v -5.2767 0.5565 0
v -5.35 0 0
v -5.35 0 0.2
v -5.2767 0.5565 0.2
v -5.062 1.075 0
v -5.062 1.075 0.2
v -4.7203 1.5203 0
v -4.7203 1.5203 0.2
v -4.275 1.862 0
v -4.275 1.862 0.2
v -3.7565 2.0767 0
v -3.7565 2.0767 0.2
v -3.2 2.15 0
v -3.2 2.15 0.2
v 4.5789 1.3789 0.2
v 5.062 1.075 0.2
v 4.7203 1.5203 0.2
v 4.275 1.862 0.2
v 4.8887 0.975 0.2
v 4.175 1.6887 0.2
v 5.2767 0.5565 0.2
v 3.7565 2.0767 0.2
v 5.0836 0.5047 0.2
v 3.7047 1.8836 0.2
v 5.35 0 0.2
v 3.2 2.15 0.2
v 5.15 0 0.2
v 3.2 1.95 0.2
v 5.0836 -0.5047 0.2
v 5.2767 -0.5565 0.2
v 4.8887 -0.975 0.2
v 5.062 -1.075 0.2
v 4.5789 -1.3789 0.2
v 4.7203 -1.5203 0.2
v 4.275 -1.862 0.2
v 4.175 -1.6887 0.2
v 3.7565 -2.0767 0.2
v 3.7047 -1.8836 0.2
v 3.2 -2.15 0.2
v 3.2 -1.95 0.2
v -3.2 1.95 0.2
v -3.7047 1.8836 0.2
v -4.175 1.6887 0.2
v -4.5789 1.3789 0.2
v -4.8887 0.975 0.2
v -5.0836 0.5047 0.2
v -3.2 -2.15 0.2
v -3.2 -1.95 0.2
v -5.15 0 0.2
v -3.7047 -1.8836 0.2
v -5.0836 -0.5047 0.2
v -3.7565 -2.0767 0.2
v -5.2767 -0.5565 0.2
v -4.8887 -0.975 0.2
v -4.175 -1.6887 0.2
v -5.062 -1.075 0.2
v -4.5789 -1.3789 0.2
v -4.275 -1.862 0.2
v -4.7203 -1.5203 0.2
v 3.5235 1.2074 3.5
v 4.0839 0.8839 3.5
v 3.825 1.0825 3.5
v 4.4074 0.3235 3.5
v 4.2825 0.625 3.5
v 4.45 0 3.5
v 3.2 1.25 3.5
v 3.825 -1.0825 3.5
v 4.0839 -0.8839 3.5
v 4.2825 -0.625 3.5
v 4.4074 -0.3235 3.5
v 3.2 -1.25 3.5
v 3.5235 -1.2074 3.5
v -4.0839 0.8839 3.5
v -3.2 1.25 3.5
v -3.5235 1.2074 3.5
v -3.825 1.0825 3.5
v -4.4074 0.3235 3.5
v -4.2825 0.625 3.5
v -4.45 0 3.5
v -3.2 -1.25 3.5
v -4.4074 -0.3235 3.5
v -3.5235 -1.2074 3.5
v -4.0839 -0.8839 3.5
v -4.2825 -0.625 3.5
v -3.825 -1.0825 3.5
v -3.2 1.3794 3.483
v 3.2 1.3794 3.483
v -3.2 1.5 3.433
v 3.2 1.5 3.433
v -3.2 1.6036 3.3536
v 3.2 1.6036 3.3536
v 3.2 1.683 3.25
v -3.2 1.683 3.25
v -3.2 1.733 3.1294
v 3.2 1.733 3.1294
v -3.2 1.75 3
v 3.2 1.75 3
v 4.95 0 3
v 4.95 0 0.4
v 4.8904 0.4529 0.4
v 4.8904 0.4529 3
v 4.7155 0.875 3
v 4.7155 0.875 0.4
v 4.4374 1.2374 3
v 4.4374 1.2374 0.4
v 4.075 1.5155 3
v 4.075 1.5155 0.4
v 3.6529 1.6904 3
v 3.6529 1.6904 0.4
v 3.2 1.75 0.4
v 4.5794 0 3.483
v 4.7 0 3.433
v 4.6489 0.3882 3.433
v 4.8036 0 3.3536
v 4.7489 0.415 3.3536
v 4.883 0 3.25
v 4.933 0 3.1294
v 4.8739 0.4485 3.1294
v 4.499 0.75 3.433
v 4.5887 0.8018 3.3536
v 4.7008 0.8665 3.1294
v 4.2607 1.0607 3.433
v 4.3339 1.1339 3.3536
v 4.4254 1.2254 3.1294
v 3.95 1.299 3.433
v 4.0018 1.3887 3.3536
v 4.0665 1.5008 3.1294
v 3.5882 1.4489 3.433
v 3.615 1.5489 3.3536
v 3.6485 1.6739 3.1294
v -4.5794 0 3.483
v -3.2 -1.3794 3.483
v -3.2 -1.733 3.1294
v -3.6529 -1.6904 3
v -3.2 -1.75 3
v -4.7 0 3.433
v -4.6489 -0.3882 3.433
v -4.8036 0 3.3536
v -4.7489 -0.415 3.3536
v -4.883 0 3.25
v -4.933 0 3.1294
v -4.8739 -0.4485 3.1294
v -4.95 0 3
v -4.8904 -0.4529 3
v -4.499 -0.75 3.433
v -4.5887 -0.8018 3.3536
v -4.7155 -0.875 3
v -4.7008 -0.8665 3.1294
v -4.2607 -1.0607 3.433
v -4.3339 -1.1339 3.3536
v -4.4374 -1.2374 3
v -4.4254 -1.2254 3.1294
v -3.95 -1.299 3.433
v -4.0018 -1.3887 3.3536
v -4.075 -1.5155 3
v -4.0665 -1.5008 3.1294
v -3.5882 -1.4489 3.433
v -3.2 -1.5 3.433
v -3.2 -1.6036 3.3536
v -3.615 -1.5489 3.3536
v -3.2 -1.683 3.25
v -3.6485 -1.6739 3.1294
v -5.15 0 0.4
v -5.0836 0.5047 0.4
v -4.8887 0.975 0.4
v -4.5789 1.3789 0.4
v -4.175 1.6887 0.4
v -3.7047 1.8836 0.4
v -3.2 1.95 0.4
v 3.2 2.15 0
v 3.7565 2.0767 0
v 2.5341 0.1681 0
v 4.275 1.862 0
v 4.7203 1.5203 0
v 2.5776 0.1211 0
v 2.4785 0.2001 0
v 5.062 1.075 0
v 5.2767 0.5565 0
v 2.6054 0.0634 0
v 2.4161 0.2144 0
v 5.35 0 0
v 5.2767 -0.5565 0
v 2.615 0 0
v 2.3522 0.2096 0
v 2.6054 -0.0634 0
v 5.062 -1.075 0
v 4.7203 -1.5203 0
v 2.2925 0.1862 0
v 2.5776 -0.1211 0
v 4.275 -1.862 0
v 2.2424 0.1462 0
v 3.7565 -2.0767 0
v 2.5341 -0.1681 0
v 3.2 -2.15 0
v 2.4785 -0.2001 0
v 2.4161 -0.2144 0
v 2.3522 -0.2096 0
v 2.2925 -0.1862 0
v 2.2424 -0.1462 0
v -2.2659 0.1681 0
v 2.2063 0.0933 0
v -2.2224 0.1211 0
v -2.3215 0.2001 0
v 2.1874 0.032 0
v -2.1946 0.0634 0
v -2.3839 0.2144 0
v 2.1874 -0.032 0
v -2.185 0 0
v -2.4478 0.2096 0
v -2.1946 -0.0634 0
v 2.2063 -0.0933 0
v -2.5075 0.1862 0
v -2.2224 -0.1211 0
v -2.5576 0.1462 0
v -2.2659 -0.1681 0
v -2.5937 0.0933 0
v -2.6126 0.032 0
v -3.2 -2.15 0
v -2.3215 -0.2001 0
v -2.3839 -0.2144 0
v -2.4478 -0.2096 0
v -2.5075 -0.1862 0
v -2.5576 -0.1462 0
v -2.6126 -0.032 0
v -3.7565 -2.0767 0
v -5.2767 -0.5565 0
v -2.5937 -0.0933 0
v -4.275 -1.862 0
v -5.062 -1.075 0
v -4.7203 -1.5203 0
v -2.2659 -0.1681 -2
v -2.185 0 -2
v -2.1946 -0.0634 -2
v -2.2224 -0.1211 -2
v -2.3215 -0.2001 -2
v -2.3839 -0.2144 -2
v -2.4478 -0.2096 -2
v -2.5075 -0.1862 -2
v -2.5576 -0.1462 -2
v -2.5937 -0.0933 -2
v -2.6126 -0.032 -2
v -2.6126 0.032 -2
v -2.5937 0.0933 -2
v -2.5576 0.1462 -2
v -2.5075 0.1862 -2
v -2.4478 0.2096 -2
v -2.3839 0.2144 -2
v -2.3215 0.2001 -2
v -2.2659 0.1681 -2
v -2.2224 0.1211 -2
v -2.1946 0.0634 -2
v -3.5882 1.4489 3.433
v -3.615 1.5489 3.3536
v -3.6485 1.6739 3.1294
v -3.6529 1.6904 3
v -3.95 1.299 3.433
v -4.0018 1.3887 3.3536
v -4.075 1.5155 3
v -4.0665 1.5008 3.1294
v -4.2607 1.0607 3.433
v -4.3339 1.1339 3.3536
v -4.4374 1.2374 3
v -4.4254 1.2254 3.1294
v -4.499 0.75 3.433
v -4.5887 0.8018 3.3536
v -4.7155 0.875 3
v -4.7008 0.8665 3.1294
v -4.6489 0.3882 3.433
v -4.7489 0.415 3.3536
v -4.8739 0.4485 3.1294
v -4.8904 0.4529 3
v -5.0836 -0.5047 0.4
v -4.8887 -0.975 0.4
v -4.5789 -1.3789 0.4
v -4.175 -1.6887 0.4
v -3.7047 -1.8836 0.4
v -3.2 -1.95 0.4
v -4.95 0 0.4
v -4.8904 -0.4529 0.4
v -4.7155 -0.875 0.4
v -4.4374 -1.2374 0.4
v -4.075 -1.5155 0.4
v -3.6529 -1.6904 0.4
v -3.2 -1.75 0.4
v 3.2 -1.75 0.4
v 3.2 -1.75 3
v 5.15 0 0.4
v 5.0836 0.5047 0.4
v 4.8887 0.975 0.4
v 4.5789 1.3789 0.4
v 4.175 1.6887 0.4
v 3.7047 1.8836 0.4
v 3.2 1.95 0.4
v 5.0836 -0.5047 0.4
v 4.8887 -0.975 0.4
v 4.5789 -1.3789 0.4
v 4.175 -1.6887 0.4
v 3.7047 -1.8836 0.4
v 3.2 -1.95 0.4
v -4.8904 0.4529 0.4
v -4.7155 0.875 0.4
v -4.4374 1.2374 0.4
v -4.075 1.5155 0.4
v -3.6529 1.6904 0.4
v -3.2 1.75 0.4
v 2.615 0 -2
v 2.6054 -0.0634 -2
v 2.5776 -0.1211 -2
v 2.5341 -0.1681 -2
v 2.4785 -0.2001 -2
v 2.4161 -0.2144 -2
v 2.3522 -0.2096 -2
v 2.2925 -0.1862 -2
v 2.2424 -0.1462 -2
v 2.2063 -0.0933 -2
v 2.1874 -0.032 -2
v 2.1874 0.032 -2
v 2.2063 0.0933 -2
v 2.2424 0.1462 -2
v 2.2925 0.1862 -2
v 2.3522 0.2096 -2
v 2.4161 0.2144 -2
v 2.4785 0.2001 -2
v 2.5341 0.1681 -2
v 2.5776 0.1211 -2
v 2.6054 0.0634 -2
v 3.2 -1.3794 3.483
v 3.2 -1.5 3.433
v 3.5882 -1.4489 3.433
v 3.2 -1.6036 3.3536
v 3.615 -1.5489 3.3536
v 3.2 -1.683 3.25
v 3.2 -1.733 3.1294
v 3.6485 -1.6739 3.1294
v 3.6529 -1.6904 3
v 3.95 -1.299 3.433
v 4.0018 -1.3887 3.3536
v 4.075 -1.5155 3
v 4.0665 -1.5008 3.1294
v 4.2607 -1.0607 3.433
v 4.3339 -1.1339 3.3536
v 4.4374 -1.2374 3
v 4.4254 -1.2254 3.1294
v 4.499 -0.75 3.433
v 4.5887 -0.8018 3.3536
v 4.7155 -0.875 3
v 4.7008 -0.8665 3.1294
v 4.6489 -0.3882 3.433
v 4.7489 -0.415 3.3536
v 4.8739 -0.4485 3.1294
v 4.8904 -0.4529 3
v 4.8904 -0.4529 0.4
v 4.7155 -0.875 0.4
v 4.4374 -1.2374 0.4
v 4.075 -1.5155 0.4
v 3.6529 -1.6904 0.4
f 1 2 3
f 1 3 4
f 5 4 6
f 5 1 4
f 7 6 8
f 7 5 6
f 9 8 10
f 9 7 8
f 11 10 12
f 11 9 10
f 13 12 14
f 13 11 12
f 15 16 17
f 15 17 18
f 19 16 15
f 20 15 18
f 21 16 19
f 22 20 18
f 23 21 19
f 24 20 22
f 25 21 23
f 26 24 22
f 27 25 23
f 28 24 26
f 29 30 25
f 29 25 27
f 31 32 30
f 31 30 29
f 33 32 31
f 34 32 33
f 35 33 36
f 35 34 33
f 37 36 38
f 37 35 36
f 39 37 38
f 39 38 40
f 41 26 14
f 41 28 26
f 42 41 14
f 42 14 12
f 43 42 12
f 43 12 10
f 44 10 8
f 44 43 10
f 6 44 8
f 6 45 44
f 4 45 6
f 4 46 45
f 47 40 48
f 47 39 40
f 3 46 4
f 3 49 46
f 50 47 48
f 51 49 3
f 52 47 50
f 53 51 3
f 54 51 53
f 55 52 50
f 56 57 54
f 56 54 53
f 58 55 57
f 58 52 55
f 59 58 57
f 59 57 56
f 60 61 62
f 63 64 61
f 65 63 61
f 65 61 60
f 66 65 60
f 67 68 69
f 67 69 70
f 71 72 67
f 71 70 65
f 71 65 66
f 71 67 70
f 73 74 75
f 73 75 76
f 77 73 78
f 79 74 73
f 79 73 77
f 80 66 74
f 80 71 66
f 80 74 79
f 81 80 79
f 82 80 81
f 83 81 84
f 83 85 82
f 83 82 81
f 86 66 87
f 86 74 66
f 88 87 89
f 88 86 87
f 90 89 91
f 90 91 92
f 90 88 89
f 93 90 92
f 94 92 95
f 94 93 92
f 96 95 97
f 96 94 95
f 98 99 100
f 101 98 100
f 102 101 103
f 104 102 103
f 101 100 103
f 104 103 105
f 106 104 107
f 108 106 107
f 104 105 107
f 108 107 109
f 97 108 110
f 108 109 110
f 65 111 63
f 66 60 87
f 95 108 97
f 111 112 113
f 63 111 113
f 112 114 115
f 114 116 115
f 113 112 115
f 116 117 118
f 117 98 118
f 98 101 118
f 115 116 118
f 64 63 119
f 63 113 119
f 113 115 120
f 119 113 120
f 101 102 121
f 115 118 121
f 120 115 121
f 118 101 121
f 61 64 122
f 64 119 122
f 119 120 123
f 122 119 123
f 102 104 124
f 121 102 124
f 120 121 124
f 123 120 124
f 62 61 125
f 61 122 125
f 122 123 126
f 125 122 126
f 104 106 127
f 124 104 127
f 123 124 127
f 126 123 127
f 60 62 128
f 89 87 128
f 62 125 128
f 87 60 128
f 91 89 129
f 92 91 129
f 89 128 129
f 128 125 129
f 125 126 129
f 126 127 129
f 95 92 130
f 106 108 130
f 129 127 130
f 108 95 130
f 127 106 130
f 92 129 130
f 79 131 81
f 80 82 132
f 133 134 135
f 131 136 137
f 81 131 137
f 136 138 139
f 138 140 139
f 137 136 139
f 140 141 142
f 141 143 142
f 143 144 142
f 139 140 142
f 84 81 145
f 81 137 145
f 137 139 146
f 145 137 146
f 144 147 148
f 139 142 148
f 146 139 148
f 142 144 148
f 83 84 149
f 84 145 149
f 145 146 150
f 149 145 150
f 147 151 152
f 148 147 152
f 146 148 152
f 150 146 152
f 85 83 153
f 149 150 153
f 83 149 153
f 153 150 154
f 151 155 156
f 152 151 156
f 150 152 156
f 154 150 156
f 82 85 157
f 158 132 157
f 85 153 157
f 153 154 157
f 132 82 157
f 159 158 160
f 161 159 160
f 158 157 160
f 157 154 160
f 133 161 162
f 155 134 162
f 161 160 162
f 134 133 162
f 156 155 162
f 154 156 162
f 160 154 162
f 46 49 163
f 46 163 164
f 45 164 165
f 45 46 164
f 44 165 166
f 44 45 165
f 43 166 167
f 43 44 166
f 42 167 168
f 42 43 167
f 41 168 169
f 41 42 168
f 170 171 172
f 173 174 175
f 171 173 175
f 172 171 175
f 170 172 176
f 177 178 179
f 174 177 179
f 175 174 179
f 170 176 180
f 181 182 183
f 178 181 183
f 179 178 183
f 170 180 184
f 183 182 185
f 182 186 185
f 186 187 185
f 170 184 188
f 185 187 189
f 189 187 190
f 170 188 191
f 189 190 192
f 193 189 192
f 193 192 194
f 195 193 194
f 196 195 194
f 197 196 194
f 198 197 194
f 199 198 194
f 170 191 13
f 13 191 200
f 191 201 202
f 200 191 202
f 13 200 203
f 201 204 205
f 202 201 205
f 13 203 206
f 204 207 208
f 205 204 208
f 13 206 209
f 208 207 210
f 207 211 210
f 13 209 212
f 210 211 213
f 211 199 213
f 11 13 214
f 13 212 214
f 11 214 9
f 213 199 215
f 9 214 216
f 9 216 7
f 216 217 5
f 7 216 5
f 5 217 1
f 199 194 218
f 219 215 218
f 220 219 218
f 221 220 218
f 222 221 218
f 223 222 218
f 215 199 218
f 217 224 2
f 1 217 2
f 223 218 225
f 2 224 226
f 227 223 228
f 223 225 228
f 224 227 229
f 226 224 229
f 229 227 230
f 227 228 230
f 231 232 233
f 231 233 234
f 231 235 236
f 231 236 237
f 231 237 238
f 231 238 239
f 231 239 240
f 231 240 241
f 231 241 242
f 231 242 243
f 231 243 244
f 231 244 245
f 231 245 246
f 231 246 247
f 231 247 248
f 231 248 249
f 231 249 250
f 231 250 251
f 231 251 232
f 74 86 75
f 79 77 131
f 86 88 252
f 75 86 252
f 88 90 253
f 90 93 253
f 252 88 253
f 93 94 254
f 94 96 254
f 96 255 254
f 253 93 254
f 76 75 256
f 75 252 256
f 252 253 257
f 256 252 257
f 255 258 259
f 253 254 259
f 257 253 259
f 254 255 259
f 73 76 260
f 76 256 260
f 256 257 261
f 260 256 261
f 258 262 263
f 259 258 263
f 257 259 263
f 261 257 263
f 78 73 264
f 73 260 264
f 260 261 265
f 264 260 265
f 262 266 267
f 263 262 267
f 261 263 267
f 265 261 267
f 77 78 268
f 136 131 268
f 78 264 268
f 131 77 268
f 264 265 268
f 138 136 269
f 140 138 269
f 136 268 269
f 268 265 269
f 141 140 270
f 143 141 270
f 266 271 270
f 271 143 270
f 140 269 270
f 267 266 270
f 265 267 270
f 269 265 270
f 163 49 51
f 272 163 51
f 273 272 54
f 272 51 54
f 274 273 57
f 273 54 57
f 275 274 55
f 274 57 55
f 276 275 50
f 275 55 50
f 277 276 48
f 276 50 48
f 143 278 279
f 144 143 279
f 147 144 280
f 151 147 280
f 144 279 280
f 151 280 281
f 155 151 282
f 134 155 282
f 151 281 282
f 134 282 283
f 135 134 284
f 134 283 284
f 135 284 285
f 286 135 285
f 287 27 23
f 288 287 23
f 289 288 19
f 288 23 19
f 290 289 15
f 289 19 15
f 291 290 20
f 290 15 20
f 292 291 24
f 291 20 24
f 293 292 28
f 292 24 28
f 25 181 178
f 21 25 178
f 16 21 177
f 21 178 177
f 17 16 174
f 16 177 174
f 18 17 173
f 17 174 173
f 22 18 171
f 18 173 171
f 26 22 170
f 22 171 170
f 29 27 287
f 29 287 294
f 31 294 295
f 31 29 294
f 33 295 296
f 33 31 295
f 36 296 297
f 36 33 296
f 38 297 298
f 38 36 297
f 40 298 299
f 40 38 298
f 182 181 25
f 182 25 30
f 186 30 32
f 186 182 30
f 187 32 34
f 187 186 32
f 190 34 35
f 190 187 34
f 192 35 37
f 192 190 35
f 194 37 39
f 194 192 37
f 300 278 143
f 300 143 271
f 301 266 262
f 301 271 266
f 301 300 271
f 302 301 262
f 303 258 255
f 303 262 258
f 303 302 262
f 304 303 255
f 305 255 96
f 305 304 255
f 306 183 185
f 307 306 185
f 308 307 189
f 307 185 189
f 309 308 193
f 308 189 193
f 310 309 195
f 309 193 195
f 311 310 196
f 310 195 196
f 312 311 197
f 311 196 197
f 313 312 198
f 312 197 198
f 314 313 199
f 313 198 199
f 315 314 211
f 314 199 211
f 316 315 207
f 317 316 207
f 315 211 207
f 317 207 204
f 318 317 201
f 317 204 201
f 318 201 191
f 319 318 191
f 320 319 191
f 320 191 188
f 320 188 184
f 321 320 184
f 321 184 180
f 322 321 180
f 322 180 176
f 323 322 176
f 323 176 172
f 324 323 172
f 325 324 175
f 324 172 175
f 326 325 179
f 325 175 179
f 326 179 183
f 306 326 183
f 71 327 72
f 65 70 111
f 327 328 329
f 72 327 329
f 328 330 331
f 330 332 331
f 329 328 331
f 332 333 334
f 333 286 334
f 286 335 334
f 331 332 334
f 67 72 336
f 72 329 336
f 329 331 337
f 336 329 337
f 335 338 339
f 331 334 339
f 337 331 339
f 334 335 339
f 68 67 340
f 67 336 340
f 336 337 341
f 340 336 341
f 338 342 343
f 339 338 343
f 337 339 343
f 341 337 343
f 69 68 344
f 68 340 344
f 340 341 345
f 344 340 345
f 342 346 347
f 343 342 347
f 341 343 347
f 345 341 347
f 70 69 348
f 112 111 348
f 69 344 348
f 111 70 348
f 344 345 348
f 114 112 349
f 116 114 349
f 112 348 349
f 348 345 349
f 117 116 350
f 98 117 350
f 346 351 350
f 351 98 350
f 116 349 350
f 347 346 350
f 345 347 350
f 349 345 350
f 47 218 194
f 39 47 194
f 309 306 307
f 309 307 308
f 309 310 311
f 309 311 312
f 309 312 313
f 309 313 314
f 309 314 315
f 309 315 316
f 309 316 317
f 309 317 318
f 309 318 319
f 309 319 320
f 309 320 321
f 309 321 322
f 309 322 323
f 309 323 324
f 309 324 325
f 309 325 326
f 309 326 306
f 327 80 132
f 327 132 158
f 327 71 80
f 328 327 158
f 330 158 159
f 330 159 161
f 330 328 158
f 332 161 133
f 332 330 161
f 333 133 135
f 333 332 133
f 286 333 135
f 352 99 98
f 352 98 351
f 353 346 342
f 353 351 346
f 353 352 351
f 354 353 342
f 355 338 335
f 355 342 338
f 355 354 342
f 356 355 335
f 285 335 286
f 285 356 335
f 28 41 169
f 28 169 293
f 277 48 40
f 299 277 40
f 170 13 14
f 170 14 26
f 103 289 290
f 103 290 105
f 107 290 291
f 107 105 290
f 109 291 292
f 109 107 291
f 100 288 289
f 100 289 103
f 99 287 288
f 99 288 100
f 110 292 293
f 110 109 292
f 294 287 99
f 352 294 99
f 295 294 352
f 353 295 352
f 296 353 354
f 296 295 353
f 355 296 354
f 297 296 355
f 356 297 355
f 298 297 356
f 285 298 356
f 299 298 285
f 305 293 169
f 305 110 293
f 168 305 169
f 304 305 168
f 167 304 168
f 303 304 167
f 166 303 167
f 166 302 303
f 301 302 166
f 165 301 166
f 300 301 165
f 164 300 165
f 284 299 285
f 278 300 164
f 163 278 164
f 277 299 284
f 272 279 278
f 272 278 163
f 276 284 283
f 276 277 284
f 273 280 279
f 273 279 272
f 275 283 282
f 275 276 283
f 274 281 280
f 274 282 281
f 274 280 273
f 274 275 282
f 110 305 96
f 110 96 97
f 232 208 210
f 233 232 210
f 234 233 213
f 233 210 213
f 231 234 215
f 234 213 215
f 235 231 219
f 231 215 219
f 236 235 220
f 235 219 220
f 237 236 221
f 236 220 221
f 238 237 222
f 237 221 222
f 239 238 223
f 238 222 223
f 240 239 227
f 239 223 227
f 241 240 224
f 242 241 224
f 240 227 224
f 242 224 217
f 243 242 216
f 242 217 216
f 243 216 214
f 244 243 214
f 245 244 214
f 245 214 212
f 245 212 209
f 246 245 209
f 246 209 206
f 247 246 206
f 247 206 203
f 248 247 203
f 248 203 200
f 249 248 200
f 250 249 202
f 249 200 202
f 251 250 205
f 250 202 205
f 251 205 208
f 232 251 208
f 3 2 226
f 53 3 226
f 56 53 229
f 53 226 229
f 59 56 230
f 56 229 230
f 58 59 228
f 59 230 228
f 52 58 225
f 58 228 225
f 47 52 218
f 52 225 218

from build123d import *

# Parameters (mm, degrees)
F1_DEPTH  = 0.2
F3_DEPTH  = 0.2
F5_DEPTH  = 3.1
F8_R      = 0.5
F9_R      = 0.215
F10_DEPTH = 2


with BuildPart() as f1:
    # F0 (on Top) → F1 (new body)
    with BuildSketch(Plane.XY):
        with BuildLine():
            Line((0, 2.15), (0, 0))
            Line((0, 0), (5.35, 0))
            ThreePointArc((5.35, 0), (4.72028, 1.52028), (3.2, 2.15))
            Line((3.2, 2.15), (0, 2.15))
        make_face()
    extrude(amount=F1_DEPTH)

    # F2 (on face) → F3 (join)
    with BuildSketch(Plane.XY.offset(0.2)):
        with BuildLine():
            Line((0, 0), (5.15, 0))
            ThreePointArc((5.15, 0), (4.578858, 1.378858), (3.2, 1.95))
            Line((3.2, 1.95), (0, 1.95))
            Line((0, 1.95), (0, 0))
        make_face()
    extrude(amount=F3_DEPTH)

    # F4 (on face) → F5 (join)
    with BuildSketch(Plane.XY.offset(0.4)):
        with BuildLine():
            Line((0, 0), (4.95, 0))
            ThreePointArc((4.95, 0), (4.437437, 1.237437), (3.2, 1.75))
            Line((3.2, 1.75), (0, 1.75))
            Line((0, 1.75), (0, 0))
        make_face()
    extrude(amount=F5_DEPTH)

    # F6: F1 across face


with BuildPart() as f1_1:
    add(f1.part)
    add(f1.part.mirror(Plane(origin=(0, 0.895016, 1.719576), x_dir=(0, -1, 0), z_dir=(-1, 0, 0))))

    # F7: F1 across face


with BuildPart() as f1_2:
    add(f1_1.part)
    add(f1_1.part.mirror(Plane(origin=(0, 0, 1.739109), x_dir=(1, 0, 0), z_dir=(0, -1, 0))))

    # F8
    f8_edges = [f1_2.edges().sort_by_distance(p)[0] for p in [
        (0, 1.75, 3.5),
        (-4.95, 0, 3.5),
        (0, -1.75, 3.5),
        (4.95, 0, 3.5),
    ]]
    fillet(f8_edges, radius=F8_R)

    # F9 (on face) → F10 (join)
    with BuildSketch(Plane(origin=(0, 0, 0), x_dir=(1, 0, 0), z_dir=(0, 0, -1))):
        with Locations((2.4, 0)):
            Circle(F9_R)
        with Locations((-2.4, 0)):
            Circle(F9_R)
    extrude(amount=F10_DEPTH)


solid = f1_2.part
